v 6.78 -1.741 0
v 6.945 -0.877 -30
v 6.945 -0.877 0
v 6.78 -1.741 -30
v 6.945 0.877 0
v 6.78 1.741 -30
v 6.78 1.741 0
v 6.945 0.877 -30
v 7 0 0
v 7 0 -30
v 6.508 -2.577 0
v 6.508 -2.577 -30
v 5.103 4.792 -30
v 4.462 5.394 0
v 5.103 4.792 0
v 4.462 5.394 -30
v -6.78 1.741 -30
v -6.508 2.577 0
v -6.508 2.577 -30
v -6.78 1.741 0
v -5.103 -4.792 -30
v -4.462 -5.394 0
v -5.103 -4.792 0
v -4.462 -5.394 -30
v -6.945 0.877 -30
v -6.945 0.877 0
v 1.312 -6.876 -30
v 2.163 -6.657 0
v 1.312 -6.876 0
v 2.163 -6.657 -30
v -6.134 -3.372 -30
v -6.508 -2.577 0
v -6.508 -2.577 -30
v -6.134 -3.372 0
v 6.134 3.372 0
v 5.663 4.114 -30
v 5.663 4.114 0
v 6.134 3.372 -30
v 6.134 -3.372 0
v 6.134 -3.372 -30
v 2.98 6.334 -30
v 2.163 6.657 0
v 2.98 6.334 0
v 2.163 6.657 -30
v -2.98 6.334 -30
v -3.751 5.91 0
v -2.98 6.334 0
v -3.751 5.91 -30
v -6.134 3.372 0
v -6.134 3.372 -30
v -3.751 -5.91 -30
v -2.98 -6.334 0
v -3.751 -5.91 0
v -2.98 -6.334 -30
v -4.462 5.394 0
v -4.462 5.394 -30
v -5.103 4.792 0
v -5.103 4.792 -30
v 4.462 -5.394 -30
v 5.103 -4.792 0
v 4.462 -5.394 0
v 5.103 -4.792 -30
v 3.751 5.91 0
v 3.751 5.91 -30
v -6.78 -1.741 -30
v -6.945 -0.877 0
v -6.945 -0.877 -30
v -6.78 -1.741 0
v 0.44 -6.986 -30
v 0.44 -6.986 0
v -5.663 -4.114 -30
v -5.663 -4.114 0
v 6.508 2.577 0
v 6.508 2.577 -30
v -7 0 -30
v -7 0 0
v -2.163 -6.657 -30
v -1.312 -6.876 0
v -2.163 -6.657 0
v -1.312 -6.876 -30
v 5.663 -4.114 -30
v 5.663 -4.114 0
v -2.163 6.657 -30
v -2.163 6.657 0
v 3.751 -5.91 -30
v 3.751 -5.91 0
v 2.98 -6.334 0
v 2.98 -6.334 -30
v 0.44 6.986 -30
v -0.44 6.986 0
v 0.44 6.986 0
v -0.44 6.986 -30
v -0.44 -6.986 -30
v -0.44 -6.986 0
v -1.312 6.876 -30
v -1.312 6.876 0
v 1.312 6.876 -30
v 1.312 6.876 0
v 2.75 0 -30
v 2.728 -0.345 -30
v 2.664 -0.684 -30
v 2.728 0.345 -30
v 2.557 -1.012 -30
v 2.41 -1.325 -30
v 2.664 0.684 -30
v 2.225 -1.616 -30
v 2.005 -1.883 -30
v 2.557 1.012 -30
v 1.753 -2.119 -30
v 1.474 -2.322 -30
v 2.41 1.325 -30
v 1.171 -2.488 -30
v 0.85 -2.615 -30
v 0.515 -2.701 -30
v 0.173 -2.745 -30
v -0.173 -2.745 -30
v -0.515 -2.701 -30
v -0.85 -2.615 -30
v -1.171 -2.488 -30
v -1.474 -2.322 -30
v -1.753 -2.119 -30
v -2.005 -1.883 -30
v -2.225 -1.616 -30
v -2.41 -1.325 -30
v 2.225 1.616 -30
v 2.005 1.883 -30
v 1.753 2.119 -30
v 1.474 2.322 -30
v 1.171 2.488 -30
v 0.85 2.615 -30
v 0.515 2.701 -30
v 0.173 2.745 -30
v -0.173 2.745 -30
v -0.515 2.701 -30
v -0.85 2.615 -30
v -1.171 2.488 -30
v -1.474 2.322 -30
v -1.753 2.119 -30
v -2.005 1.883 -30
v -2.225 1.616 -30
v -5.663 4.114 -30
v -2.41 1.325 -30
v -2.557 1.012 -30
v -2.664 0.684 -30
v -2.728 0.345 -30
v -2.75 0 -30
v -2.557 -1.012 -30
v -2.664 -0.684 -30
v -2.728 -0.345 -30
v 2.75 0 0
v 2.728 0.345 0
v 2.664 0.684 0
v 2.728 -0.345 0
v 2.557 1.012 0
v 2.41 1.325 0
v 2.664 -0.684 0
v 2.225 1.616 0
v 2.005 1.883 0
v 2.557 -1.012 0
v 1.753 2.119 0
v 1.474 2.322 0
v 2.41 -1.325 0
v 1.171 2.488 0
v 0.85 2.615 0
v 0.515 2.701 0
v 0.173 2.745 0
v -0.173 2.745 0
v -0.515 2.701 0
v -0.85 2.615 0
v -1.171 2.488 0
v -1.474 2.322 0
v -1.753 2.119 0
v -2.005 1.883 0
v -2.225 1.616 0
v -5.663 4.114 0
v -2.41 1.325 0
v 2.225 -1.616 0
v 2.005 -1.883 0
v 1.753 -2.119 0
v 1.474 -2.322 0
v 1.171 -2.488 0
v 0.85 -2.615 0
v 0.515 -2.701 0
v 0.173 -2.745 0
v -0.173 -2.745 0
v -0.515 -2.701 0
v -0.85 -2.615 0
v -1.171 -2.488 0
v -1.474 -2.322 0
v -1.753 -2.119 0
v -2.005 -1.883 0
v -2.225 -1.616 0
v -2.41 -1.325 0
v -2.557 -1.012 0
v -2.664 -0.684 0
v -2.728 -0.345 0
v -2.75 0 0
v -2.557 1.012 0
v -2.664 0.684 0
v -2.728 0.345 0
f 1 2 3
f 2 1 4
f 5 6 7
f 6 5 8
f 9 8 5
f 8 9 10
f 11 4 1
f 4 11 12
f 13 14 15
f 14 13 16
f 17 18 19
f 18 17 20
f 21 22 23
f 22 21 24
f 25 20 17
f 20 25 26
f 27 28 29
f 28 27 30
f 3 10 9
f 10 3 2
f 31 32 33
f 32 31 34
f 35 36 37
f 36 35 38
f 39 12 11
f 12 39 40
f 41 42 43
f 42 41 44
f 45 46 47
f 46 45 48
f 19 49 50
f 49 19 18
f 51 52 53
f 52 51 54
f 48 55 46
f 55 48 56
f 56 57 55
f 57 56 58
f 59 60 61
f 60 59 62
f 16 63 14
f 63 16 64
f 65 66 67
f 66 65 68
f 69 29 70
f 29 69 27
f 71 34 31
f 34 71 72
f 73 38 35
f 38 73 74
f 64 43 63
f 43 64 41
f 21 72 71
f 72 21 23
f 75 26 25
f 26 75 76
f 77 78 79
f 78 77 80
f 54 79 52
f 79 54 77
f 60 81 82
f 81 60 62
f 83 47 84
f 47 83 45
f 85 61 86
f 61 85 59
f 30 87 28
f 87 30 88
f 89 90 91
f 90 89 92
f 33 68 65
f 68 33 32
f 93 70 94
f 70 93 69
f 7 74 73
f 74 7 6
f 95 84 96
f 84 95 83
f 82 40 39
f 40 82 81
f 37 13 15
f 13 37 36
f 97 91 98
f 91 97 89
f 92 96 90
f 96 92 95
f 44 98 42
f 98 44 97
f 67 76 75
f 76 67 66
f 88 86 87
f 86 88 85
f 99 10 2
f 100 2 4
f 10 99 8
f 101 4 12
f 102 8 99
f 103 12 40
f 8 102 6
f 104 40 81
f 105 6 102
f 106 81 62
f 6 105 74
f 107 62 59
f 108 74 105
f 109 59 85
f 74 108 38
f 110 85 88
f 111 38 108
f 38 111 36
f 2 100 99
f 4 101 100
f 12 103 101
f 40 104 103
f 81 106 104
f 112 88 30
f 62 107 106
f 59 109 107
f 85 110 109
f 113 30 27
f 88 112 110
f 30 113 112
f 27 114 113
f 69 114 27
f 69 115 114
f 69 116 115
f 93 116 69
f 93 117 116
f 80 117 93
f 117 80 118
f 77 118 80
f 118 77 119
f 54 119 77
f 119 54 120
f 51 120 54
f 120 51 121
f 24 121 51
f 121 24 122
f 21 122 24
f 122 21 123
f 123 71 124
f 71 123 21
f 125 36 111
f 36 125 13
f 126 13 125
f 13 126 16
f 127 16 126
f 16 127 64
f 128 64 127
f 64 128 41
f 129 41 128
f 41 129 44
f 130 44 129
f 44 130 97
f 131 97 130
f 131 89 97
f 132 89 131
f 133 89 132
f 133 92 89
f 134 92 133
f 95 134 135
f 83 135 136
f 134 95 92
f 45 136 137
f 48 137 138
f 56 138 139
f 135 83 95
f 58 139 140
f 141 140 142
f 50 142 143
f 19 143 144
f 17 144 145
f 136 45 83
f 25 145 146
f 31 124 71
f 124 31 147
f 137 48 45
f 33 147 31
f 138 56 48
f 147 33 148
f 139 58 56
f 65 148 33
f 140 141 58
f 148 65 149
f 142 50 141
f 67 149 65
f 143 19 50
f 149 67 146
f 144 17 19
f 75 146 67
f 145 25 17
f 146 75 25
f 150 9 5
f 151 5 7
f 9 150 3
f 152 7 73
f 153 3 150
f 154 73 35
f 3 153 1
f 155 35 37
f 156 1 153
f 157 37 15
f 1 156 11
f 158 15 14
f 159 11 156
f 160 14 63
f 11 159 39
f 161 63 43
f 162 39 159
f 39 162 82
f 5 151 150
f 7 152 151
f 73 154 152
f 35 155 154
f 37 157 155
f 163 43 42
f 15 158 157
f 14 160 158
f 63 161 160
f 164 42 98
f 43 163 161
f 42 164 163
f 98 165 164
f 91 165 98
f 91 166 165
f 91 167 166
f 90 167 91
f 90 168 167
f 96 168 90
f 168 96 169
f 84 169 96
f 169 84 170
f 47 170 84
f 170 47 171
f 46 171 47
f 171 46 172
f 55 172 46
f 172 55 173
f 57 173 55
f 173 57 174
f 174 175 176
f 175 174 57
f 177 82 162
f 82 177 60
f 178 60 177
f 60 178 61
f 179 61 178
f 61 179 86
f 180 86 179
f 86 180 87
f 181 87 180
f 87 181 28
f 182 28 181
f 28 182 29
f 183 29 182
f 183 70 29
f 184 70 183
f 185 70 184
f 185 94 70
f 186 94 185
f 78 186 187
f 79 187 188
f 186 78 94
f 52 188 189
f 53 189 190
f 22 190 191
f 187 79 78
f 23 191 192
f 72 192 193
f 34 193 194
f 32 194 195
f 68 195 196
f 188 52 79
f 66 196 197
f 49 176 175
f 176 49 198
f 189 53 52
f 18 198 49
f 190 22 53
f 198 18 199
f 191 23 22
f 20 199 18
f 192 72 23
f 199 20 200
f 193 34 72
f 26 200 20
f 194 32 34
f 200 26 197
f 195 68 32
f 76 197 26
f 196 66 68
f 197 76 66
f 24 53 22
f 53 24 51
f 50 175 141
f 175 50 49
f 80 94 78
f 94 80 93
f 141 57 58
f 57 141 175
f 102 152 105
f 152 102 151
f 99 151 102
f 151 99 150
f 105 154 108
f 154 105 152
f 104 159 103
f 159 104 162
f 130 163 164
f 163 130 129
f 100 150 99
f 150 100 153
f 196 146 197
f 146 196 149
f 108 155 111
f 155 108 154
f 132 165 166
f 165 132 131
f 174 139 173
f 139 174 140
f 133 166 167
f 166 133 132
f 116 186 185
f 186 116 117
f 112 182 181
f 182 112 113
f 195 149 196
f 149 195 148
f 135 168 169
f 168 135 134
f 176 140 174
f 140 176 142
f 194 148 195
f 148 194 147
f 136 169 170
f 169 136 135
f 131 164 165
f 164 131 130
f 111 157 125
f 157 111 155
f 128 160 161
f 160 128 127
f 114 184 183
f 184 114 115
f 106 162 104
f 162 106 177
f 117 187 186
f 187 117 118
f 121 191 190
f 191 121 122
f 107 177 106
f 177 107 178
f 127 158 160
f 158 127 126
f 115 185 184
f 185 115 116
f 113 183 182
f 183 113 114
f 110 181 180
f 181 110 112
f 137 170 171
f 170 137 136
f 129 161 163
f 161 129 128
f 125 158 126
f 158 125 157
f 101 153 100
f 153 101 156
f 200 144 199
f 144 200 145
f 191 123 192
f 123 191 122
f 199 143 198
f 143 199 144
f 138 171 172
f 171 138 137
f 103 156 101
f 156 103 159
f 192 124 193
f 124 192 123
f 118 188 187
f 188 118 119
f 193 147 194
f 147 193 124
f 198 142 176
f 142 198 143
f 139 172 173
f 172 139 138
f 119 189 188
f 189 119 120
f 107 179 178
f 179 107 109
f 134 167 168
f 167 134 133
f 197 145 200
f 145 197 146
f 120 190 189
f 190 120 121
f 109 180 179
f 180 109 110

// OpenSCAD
$fn = 50;


difference() {
	union() {
		translate(v = [0, 0, -30.0000000000]) {
			cylinder(h = 30, r = 7.0000000000);
		}
		cylinder(h = 0, r = 16.0000000000);
	}
	union() {
		#translate(v = [0, 0, -30]) {
			cylinder(h = 30, r = 2.7500000000);
		}
	}
}
